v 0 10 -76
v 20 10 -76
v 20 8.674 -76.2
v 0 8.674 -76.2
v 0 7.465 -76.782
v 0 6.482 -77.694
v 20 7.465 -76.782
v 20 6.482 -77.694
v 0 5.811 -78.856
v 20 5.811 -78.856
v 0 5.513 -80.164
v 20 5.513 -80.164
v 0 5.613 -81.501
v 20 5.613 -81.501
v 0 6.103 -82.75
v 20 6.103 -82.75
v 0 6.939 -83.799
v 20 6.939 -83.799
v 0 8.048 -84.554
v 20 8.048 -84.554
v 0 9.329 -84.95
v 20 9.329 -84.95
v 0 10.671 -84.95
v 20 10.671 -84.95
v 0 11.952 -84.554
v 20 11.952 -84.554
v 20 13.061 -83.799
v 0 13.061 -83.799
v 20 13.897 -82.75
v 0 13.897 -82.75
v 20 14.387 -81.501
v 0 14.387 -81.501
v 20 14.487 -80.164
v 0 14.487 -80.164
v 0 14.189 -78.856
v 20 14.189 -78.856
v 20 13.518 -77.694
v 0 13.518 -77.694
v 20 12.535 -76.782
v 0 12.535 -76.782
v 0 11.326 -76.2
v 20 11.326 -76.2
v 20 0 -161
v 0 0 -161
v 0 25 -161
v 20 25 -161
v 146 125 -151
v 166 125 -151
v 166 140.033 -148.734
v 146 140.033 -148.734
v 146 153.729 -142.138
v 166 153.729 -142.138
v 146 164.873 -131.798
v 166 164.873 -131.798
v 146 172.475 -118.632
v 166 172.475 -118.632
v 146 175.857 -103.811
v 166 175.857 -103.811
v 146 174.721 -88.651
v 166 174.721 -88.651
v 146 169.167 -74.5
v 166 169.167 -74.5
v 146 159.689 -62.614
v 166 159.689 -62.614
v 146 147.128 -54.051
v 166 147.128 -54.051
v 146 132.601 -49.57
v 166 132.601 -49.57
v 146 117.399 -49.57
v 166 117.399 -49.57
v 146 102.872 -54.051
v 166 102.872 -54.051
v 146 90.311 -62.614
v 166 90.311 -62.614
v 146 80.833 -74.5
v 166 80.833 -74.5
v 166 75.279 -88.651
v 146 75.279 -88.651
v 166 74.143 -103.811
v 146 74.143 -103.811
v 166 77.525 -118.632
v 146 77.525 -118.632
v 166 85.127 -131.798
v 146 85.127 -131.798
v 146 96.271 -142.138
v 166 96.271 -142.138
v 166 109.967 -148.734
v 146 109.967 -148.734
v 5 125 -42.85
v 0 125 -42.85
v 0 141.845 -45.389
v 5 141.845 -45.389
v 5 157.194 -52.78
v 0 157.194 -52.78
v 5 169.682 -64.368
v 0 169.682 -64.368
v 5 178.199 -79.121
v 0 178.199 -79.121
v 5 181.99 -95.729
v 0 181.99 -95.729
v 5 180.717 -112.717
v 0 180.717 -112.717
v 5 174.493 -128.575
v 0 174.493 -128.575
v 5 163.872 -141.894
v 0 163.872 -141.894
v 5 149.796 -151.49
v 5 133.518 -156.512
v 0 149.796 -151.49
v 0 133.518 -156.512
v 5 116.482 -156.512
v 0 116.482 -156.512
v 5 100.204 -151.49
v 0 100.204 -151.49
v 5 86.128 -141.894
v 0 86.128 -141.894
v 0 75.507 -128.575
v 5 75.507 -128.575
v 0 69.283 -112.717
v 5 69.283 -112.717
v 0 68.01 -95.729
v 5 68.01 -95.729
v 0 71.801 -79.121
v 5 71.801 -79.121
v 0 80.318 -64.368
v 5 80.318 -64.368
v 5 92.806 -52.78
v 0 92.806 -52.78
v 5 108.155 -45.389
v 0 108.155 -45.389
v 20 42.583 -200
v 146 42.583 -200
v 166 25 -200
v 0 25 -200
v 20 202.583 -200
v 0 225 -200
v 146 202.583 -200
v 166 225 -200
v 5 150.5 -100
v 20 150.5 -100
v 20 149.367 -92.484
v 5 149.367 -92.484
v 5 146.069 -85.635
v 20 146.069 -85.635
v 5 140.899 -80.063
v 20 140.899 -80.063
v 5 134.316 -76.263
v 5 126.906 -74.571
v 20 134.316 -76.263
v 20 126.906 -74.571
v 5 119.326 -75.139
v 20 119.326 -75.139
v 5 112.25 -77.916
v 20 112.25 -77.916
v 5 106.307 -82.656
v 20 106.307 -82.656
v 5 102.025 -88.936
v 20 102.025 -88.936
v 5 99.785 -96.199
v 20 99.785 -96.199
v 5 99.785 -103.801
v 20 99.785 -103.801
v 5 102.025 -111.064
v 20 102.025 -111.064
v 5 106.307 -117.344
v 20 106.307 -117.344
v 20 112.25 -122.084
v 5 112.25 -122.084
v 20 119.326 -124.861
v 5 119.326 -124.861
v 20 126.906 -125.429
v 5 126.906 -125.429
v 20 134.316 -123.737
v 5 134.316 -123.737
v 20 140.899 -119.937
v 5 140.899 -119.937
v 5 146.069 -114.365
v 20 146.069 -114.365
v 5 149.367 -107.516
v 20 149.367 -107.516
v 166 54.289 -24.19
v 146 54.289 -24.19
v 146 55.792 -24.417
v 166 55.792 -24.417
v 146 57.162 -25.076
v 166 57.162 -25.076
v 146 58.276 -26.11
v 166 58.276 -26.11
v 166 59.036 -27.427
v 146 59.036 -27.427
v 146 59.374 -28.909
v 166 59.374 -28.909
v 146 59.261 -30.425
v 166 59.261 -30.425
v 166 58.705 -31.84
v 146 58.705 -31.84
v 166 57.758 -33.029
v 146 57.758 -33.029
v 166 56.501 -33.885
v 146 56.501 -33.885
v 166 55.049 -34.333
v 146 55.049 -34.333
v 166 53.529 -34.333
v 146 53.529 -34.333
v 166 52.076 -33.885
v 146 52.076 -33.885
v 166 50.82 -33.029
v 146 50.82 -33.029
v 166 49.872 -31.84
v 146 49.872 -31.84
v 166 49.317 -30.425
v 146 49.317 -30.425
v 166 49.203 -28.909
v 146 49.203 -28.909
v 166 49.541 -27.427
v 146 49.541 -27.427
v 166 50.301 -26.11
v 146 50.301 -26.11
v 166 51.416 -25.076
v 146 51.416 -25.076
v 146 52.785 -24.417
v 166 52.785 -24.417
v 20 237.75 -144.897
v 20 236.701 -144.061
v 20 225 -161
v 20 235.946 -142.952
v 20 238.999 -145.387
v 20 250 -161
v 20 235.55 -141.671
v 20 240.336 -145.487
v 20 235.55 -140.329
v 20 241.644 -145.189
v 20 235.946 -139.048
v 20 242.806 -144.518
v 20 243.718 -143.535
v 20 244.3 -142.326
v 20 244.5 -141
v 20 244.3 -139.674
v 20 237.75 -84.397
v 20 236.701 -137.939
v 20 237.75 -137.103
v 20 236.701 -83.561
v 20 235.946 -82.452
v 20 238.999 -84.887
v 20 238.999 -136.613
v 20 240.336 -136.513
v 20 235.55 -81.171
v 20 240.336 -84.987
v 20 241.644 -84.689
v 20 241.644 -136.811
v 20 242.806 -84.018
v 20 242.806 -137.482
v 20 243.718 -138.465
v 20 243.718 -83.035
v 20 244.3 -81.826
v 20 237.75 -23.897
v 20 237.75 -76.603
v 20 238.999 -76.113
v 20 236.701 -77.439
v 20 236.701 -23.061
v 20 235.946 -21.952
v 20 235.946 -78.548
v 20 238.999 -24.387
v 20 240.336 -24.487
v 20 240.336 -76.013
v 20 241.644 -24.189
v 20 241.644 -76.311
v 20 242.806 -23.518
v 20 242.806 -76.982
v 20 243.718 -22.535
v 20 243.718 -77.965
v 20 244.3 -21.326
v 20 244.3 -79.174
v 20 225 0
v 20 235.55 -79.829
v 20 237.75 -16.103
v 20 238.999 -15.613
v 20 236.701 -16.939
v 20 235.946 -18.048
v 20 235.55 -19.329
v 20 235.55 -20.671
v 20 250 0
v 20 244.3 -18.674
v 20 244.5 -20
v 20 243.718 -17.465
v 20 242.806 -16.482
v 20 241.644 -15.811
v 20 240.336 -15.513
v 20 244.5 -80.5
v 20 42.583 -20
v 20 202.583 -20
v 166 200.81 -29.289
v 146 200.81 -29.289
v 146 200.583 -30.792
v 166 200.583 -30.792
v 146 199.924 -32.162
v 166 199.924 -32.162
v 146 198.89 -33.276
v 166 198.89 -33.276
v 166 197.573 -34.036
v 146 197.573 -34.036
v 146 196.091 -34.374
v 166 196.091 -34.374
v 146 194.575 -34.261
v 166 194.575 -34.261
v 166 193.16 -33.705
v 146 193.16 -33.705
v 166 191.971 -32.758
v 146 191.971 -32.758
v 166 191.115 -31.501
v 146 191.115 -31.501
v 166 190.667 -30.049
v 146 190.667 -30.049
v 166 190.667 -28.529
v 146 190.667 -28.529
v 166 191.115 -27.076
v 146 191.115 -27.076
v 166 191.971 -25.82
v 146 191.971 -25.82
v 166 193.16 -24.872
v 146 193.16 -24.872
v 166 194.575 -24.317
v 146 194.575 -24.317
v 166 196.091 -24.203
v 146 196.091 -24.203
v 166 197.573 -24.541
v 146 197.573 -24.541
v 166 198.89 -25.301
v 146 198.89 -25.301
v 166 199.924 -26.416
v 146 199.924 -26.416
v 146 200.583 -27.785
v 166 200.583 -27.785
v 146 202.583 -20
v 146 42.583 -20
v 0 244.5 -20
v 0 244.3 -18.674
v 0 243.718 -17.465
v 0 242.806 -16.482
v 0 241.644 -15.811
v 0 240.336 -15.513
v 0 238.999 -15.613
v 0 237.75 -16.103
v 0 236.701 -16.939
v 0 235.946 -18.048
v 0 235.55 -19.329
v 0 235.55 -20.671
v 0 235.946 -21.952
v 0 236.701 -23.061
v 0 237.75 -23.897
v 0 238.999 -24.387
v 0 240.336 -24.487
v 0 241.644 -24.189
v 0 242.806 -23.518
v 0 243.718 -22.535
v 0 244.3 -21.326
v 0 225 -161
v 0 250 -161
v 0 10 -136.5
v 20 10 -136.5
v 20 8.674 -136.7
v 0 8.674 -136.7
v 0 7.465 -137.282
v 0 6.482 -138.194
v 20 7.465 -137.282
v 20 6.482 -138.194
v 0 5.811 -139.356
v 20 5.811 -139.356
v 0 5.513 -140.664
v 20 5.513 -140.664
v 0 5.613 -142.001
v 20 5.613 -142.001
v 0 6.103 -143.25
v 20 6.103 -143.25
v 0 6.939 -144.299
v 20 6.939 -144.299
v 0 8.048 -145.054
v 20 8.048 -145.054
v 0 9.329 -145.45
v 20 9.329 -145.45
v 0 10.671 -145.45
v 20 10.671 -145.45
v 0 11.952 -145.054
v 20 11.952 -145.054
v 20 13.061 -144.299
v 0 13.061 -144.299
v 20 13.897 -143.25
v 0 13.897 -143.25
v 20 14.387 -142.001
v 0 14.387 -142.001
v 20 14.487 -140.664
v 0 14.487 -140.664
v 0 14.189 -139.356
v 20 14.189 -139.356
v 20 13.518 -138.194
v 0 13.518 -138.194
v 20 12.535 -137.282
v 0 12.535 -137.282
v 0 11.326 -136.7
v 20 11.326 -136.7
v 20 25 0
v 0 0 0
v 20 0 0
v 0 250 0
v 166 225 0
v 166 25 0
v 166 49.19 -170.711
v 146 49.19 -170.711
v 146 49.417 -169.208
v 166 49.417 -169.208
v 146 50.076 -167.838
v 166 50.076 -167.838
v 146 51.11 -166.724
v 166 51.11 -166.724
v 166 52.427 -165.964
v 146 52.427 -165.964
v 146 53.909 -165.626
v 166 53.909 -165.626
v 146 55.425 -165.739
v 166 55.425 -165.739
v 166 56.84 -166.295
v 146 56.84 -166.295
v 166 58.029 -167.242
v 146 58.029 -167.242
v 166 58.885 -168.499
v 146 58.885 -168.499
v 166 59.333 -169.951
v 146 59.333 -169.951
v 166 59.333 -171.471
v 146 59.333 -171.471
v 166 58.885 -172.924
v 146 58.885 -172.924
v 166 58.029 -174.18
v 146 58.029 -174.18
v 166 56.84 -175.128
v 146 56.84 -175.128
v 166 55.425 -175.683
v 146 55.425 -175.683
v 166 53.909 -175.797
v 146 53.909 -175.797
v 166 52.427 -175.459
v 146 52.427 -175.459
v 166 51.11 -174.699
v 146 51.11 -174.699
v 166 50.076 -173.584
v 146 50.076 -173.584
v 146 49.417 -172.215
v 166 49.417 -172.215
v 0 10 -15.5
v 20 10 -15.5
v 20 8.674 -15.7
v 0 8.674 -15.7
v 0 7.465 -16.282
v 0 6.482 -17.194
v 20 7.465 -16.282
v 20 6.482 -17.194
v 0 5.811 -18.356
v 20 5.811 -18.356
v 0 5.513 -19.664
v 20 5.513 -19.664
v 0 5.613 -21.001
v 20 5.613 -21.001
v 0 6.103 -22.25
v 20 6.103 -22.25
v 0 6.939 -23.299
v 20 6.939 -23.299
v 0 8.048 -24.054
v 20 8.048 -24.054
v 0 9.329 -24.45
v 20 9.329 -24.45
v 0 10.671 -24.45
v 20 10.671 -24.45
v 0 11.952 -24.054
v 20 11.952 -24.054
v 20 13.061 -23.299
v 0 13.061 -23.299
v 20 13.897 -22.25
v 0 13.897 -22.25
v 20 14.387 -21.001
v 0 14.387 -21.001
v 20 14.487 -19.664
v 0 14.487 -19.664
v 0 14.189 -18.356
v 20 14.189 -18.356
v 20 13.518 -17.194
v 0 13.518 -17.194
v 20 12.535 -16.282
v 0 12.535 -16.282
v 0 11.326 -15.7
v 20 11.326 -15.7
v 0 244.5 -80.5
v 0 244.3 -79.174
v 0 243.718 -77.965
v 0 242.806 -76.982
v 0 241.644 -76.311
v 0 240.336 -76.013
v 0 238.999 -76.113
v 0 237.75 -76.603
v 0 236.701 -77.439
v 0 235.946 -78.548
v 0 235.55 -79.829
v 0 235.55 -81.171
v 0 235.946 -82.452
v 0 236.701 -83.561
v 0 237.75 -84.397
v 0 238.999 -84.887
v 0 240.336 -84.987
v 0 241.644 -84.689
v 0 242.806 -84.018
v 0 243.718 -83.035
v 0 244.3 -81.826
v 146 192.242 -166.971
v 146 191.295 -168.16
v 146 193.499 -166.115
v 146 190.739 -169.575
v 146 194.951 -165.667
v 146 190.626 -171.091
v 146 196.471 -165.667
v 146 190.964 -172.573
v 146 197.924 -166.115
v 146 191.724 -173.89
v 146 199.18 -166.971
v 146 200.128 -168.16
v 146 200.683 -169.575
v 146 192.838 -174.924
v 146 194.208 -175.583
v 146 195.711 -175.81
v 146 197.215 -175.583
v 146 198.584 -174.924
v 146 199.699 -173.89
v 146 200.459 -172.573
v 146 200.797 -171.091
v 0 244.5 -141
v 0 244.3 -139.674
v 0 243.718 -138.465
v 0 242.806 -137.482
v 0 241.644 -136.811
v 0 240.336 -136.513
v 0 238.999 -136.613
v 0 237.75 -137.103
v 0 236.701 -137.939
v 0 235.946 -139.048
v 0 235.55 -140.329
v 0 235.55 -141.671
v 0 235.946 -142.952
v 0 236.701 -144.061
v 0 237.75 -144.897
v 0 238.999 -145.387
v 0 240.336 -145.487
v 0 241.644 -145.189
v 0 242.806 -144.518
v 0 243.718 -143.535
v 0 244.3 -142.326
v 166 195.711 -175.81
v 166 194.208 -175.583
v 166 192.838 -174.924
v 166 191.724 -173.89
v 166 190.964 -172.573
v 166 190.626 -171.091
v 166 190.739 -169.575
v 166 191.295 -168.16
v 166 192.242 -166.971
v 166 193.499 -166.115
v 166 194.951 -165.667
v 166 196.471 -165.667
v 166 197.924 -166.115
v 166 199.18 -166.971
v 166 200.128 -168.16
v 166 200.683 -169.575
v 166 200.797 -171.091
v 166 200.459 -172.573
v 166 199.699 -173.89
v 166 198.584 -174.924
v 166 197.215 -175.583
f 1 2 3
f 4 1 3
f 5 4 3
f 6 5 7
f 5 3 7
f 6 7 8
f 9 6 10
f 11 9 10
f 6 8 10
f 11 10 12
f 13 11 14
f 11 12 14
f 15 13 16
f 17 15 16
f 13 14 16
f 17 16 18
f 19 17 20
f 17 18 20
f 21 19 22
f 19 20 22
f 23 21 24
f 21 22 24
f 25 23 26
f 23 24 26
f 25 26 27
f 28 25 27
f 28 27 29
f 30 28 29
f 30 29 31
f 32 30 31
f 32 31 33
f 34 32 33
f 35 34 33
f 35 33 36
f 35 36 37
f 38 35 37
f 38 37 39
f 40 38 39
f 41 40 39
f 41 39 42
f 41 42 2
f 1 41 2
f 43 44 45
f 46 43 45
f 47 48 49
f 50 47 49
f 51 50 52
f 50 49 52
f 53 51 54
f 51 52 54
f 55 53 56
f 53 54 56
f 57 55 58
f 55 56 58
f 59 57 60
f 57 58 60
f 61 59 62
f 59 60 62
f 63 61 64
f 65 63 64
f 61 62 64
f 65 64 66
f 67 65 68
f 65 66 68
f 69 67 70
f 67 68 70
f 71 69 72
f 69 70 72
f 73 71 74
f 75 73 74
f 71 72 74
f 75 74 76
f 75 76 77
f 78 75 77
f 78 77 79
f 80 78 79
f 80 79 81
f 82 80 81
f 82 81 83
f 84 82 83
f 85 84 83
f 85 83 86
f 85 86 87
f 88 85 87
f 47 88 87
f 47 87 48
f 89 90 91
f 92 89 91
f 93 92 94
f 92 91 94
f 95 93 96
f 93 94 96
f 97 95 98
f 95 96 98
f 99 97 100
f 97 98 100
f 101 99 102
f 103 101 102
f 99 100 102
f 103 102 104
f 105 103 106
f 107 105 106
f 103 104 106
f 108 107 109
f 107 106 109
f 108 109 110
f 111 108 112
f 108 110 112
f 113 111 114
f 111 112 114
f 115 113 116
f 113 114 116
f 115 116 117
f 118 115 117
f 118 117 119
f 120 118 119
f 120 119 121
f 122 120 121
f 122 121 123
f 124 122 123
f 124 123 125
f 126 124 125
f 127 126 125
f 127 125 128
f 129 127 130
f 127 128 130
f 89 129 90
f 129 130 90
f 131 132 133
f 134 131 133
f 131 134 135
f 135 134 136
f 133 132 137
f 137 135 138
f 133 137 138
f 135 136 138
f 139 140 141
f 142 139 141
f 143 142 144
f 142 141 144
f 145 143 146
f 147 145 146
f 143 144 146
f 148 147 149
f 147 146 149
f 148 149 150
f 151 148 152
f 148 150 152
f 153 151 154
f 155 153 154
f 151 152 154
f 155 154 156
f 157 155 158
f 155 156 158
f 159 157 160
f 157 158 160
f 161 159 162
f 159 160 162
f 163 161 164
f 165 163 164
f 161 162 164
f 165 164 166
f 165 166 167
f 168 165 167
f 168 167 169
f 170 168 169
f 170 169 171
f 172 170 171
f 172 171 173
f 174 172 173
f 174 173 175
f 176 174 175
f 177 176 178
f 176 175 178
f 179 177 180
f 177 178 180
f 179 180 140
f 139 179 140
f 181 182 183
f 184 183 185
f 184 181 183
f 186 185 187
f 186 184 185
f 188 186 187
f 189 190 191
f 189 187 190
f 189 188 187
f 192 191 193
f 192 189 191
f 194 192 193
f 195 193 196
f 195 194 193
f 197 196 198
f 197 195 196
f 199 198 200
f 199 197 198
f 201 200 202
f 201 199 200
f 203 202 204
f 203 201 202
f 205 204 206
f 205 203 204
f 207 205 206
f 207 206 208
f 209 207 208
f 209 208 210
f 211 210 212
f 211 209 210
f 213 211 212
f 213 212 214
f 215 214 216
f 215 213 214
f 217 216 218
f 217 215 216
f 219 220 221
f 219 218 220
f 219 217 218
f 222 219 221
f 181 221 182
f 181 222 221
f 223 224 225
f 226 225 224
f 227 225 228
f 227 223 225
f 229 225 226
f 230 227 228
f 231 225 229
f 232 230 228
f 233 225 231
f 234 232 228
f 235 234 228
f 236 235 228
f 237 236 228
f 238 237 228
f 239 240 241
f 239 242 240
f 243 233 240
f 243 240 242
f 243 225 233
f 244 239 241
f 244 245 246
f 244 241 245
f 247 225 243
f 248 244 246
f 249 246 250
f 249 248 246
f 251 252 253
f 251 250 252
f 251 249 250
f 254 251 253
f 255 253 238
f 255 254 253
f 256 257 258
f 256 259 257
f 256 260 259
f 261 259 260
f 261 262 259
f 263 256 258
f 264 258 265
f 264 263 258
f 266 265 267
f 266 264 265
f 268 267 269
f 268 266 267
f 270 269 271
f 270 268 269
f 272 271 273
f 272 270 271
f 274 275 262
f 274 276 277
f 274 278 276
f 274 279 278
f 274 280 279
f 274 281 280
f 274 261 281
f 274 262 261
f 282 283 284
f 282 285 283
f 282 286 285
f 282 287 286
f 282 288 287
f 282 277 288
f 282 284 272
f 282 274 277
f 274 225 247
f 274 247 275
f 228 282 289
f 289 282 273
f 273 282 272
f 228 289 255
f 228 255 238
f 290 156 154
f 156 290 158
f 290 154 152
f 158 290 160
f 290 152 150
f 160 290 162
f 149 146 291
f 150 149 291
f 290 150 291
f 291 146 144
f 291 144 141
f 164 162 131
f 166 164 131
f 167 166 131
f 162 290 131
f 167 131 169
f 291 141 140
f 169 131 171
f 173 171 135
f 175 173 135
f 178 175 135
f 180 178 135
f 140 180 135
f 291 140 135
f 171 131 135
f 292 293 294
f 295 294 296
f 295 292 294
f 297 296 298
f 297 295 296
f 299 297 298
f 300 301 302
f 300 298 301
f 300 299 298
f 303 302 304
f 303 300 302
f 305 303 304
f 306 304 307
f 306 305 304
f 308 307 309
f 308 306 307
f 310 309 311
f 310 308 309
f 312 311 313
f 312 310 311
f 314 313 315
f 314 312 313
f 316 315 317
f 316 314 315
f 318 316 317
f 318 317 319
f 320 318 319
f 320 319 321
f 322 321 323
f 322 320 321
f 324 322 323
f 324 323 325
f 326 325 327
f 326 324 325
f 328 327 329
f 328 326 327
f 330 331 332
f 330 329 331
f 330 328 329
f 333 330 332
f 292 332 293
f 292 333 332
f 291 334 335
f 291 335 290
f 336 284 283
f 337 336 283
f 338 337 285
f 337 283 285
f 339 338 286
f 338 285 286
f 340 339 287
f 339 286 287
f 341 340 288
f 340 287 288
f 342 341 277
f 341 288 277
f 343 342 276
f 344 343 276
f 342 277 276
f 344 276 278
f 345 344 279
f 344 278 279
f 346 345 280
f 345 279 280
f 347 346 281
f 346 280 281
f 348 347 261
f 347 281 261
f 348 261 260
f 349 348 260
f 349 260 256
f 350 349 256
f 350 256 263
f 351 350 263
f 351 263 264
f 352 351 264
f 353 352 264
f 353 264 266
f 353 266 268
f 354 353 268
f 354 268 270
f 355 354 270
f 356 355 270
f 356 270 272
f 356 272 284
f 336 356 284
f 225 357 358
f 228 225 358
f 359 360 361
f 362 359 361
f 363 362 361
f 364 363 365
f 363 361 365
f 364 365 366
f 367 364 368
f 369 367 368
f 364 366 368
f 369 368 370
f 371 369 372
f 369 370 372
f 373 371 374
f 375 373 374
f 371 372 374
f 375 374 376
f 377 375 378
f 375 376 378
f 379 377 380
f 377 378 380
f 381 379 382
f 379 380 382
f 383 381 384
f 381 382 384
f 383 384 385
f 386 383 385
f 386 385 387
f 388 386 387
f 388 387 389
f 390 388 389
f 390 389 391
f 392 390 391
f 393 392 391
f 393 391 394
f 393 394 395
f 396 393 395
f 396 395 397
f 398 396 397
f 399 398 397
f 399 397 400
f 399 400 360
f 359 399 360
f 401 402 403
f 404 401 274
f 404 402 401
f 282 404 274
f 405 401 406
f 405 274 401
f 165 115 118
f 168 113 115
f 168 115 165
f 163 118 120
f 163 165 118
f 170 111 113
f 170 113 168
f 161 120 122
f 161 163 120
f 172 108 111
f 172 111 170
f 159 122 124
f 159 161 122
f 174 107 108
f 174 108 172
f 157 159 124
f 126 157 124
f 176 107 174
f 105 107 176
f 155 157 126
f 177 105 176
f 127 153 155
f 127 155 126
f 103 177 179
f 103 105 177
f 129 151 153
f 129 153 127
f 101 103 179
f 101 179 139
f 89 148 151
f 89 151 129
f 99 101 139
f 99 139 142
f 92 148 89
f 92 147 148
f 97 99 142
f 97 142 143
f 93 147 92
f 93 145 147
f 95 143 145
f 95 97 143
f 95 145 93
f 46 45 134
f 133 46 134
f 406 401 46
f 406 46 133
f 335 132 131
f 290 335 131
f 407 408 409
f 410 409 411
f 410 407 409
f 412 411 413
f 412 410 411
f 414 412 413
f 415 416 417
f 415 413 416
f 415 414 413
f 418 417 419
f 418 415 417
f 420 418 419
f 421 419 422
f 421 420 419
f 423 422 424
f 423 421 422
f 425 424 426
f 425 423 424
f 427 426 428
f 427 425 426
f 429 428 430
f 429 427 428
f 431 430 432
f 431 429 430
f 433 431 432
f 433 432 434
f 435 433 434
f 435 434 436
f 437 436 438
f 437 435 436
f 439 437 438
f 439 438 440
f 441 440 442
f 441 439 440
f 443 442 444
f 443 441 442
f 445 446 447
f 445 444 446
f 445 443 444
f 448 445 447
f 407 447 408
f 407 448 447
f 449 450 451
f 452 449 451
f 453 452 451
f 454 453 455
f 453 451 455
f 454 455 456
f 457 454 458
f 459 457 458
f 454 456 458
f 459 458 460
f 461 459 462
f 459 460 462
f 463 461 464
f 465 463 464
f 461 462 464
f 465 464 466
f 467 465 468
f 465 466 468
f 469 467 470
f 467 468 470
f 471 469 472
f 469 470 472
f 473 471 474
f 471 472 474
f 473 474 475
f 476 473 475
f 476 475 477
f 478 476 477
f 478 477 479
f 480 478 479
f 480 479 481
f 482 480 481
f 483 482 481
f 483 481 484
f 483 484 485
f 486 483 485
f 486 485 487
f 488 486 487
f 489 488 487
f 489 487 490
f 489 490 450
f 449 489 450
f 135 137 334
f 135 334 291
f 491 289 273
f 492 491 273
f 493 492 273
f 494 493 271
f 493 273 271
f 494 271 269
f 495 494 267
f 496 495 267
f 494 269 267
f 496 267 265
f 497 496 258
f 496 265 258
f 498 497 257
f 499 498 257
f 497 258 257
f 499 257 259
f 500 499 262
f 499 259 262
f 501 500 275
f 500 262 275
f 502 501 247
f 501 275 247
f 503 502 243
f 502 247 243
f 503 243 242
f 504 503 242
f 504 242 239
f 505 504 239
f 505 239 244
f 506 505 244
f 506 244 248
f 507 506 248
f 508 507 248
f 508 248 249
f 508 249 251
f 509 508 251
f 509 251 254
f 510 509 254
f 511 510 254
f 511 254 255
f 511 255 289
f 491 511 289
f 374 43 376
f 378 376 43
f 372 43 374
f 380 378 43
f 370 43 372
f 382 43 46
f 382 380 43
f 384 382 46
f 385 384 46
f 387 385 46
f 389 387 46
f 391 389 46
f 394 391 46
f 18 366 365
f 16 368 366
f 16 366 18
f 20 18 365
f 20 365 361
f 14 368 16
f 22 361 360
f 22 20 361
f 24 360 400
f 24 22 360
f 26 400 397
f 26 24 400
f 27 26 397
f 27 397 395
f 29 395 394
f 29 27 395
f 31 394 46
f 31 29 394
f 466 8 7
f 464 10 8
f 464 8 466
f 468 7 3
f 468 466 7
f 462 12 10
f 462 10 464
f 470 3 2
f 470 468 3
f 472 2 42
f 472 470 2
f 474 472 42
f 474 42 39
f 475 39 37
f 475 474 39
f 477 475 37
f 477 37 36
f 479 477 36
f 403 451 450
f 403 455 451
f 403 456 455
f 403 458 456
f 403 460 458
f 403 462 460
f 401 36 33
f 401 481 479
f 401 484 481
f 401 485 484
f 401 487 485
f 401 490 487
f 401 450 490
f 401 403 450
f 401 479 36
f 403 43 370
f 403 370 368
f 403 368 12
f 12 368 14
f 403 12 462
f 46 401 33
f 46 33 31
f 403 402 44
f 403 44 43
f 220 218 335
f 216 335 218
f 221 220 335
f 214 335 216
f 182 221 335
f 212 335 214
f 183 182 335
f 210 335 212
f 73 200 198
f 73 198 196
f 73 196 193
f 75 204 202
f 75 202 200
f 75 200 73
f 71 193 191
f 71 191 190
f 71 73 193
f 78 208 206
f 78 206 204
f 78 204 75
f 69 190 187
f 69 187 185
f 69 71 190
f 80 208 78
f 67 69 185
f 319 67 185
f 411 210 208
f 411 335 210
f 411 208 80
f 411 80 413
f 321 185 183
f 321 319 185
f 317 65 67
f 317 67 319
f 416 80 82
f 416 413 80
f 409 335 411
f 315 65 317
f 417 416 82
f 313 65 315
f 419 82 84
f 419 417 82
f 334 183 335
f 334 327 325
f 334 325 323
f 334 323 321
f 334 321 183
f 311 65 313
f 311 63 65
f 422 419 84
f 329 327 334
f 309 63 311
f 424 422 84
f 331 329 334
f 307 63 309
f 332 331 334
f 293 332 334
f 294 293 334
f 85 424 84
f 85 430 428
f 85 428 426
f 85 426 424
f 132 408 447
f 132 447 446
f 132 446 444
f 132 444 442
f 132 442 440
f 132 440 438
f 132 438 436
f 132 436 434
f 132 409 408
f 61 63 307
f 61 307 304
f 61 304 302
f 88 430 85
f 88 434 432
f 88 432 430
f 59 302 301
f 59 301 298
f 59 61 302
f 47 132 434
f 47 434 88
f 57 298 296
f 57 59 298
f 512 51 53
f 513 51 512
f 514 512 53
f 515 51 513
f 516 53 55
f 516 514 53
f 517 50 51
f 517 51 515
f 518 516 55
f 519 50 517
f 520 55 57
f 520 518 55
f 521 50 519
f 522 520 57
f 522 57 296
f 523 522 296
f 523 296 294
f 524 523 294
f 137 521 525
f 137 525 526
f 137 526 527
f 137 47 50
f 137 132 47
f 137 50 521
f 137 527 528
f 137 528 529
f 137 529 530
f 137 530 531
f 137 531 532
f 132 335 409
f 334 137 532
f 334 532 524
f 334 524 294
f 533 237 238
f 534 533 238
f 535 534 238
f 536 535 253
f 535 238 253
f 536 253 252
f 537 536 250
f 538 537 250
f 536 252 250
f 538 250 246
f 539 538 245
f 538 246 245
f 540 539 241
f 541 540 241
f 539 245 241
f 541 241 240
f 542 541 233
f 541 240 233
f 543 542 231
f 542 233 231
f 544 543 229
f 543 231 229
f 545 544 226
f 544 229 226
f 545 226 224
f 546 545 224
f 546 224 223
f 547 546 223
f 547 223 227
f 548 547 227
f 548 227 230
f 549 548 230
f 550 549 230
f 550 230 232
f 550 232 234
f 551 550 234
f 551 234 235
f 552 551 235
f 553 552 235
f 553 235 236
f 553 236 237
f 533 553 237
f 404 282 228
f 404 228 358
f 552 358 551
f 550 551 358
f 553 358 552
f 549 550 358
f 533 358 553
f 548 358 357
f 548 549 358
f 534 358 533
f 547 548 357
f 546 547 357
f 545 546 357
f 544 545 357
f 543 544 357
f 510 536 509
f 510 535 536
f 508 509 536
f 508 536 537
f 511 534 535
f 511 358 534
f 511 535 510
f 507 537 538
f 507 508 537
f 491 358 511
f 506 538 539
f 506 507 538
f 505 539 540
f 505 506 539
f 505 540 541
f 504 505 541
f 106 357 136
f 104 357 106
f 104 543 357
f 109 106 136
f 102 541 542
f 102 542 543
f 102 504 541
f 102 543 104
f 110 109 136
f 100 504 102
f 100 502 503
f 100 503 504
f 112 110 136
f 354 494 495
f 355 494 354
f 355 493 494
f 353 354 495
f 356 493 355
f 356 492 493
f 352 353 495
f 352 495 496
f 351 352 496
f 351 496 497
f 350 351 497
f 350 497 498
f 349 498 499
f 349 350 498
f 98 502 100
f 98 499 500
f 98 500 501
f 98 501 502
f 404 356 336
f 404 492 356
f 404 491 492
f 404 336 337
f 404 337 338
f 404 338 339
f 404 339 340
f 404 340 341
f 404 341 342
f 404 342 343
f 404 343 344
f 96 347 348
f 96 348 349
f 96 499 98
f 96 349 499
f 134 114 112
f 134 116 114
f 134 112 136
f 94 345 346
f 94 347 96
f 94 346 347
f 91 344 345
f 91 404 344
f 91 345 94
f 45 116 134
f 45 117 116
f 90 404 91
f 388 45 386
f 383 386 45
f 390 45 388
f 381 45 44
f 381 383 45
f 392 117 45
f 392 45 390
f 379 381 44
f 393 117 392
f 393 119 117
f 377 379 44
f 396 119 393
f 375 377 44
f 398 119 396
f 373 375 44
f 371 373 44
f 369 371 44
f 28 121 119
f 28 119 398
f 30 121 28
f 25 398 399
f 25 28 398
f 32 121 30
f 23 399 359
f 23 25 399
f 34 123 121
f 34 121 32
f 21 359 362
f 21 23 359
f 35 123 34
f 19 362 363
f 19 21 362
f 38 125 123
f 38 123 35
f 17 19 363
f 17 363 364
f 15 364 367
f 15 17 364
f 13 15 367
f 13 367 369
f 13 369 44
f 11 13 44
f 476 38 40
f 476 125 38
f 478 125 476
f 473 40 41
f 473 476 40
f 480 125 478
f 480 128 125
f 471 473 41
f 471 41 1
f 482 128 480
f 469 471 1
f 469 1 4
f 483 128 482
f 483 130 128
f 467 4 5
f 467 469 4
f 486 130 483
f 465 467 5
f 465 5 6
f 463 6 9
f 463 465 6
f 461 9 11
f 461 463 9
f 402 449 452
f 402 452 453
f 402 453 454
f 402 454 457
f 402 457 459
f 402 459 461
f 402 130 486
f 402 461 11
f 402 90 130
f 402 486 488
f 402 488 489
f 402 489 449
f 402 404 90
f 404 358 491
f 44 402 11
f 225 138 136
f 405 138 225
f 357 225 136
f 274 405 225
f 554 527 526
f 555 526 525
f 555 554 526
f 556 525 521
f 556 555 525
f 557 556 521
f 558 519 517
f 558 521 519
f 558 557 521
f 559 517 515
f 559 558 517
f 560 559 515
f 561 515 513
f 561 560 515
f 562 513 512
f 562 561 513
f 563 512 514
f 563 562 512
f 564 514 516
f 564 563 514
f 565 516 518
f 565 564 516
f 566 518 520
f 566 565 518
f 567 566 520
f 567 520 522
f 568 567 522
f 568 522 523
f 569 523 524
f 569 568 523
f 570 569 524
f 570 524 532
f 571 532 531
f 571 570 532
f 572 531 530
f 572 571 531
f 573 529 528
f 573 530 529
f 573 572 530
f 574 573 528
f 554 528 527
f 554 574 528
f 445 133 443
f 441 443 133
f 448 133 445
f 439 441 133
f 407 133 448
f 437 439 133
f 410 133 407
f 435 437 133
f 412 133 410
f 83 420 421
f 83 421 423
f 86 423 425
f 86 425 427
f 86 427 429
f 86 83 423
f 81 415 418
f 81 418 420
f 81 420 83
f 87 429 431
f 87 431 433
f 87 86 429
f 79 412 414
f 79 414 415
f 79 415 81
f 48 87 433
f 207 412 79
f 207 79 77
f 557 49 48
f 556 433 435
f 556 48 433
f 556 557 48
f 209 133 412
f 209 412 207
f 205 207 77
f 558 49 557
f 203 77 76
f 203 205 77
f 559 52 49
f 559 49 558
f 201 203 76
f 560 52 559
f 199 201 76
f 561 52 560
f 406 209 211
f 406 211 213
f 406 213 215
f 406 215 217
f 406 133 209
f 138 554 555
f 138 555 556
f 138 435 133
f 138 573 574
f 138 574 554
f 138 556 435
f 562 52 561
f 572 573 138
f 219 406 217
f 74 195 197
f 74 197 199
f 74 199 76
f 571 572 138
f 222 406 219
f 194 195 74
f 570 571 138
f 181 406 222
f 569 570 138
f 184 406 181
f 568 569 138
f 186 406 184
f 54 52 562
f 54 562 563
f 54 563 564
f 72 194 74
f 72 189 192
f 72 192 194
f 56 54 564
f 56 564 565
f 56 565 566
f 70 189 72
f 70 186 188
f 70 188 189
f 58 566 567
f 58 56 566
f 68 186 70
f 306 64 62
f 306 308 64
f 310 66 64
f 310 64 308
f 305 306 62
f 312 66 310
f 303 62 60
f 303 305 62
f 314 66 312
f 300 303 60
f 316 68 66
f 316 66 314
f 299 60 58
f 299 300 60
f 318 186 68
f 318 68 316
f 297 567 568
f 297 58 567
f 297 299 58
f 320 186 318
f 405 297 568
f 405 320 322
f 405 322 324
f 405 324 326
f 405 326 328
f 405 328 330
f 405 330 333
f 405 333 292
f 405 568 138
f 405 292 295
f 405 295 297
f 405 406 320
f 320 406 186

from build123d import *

# Parameters (mm, degrees)
EXTRUDE_1_DEPTH          = 200
SKETCH_2_W               = 39
SKETCH_2_H               = 25
CUT_EXTRUDE_1_DEPTH      = 20
SKETCH_3_W               = 126
SKETCH_3_H               = 160
CUT_EXTRUDE_2_DEPTH      = 180
CUT_EXTRUDE_3_REACH      = 362.633
SKETCH_4_R               = 51
SKETCH_5_R               = 25.5
CUT_EXTRUDE_4_DEPTH      = 15
SKETCH_6_R               = 57.15
CUT_EXTRUDE_5_DEPTH      = 5
CUT_EXTRUDE_6_REACH      = 353.875
SKETCH_7_R               = 4.5
PATTERN_CIRCULAR_1_COUNT = 4


with BuildPart() as part:
    # 草图1 → 凸台-拉伸1 (new body)
    with BuildSketch(Plane.XY):
        Polygon((20, 225), (20, 250), (0, 250), (0, 0), (20, 0), (20, 25), (166, 25), (166, 225), align=None)
    extrude(amount=-EXTRUDE_1_DEPTH)

    # 草图2 → 切除-拉伸1 (cut)
    with BuildSketch(Plane.ZY):
        with Locations((-180.5, 237.5)):
            Rectangle(SKETCH_2_W, SKETCH_2_H)
        with Locations((-180.5, 12.5)):
            Rectangle(SKETCH_2_W, SKETCH_2_H)
    extrude(amount=-CUT_EXTRUDE_1_DEPTH, mode=Mode.SUBTRACT)

    # 草图3 → 切除-拉伸2 (cut)
    with BuildSketch(Plane(origin=(0, 0, -200), x_dir=(-1, 0, 0), z_dir=(0, 0, -1))):
        with Locations((-83, 122.583335177)):
            Rectangle(SKETCH_3_W, SKETCH_3_H)
    extrude(amount=-CUT_EXTRUDE_2_DEPTH, mode=Mode.SUBTRACT)

    # 草图4 → 切除-拉伸3 (cut, up to next)
    with BuildSketch(Plane(origin=(166, 0, 0), x_dir=(0, 0, -1), z_dir=(1, 0, 0)), mode=Mode.PRIVATE) as cut_extrude_3_sk1:
        with Locations((100, 125)):
            Circle(SKETCH_4_R)
    cut_extrude_3_tool1 = extrude(cut_extrude_3_sk1.sketch, amount=-CUT_EXTRUDE_3_REACH, mode=Mode.PRIVATE) & part.part
    add(cut_extrude_3_tool1.solids().sort_by_distance((166, 125, -100))[0], mode=Mode.SUBTRACT)

    # 草图5 → 切除-拉伸4 (cut)
    with BuildSketch(Plane(origin=(20, 0, 0), x_dir=(0, 0, -1), z_dir=(1, 0, 0))):
        with Locations(Location((100, 125, 0), (0, 0, 90))):
            Circle(SKETCH_5_R)
    extrude(amount=-CUT_EXTRUDE_4_DEPTH, mode=Mode.SUBTRACT)

    # 草图6 → 切除-拉伸5 (cut)
    with BuildSketch(Plane.ZY):
        with Locations((-100, 125)):
            Circle(SKETCH_6_R)
    extrude(amount=-CUT_EXTRUDE_5_DEPTH, mode=Mode.SUBTRACT)

    # 草图7 → 切除-拉伸6 (cut, up to next)
    with BuildSketch(Plane(origin=(20, 0, 0), x_dir=(0, 0, -1), z_dir=(1, 0, 0)), mode=Mode.PRIVATE) as cut_extrude_6_sk1:
        with Locations(Location((20, 240, 0), (0, 0, 90))):
            Circle(SKETCH_7_R)
    cut_extrude_6_tool1 = extrude(cut_extrude_6_sk1.sketch, amount=-CUT_EXTRUDE_6_REACH, mode=Mode.PRIVATE) & part.part
    # 草图7 → 切除-拉伸6 (cut, up to next)
    with BuildSketch(Plane(origin=(20, 0, 0), x_dir=(0, 0, -1), z_dir=(1, 0, 0)), mode=Mode.PRIVATE) as cut_extrude_6_sk2:
        with Locations(Location((80.5, 240, 0), (0, 0, 90))):
            Circle(SKETCH_7_R)
    cut_extrude_6_tool2 = extrude(cut_extrude_6_sk2.sketch, amount=-CUT_EXTRUDE_6_REACH, mode=Mode.PRIVATE) & part.part
    # 草图7 → 切除-拉伸6 (cut, up to next)
    with BuildSketch(Plane(origin=(20, 0, 0), x_dir=(0, 0, -1), z_dir=(1, 0, 0)), mode=Mode.PRIVATE) as cut_extrude_6_sk3:
        with Locations(Location((141, 240, 0), (0, 0, 90))):
            Circle(SKETCH_7_R)
    cut_extrude_6_tool3 = extrude(cut_extrude_6_sk3.sketch, amount=-CUT_EXTRUDE_6_REACH, mode=Mode.PRIVATE) & part.part
    # 草图7 → 切除-拉伸6 (cut, up to next)
    with BuildSketch(Plane(origin=(20, 0, 0), x_dir=(0, 0, -1), z_dir=(1, 0, 0)), mode=Mode.PRIVATE) as cut_extrude_6_sk4:
        with Locations(Location((141, 10, 0), (0, 0, 180))):
            Circle(SKETCH_7_R)
    cut_extrude_6_tool4 = extrude(cut_extrude_6_sk4.sketch, amount=-CUT_EXTRUDE_6_REACH, mode=Mode.PRIVATE) & part.part
    # 草图7 → 切除-拉伸6 (cut, up to next)
    with BuildSketch(Plane(origin=(20, 0, 0), x_dir=(0, 0, -1), z_dir=(1, 0, 0)), mode=Mode.PRIVATE) as cut_extrude_6_sk5:
        with Locations(Location((80.5, 10, 0), (0, 0, 180))):
            Circle(SKETCH_7_R)
    cut_extrude_6_tool5 = extrude(cut_extrude_6_sk5.sketch, amount=-CUT_EXTRUDE_6_REACH, mode=Mode.PRIVATE) & part.part
    # 草图7 → 切除-拉伸6 (cut, up to next)
    with BuildSketch(Plane(origin=(20, 0, 0), x_dir=(0, 0, -1), z_dir=(1, 0, 0)), mode=Mode.PRIVATE) as cut_extrude_6_sk6:
        with Locations(Location((20, 10, 0), (0, 0, 180))):
            Circle(SKETCH_7_R)
    cut_extrude_6_tool6 = extrude(cut_extrude_6_sk6.sketch, amount=-CUT_EXTRUDE_6_REACH, mode=Mode.PRIVATE) & part.part
    add(cut_extrude_6_tool1.solids().sort_by_distance((20, 240, -20))[0], mode=Mode.SUBTRACT)
    add(cut_extrude_6_tool2.solids().sort_by_distance((20, 240, -80.5))[0], mode=Mode.SUBTRACT)
    add(cut_extrude_6_tool3.solids().sort_by_distance((20, 240, -141))[0], mode=Mode.SUBTRACT)
    add(cut_extrude_6_tool4.solids().sort_by_distance((20, 10, -141))[0], mode=Mode.SUBTRACT)
    add(cut_extrude_6_tool5.solids().sort_by_distance((20, 10, -80.5))[0], mode=Mode.SUBTRACT)
    add(cut_extrude_6_tool6.solids().sort_by_distance((20, 10, -20))[0], mode=Mode.SUBTRACT)

    # 草图9 → M12 螺纹孔1 (revolve, cut)
    with BuildSketch(Plane(origin=(166, 195.711356231, -170.71), x_dir=(0, 0, -1), z_dir=(0, 1, 0))):
        Polygon((0, 0), (0, 29.25), (5.1, 26.185610843), (5.1, 0), align=None)
    hole_wizard_m12_1 = revolve(axis=Axis((172.35, 195.711356231, -170.71), (-1, 0, 0)), mode=Mode.SUBTRACT)

    # 阵列(圆周)1: M12 螺纹孔1 ×4 about axis
    pattern_circular_1_axis = Axis((0, 125, -100), (1, 0, 0))
    for i in range(1, PATTERN_CIRCULAR_1_COUNT):
        add(hole_wizard_m12_1.rotate(pattern_circular_1_axis, i * 360 / PATTERN_CIRCULAR_1_COUNT), mode=Mode.SUBTRACT)


solid = part.part
